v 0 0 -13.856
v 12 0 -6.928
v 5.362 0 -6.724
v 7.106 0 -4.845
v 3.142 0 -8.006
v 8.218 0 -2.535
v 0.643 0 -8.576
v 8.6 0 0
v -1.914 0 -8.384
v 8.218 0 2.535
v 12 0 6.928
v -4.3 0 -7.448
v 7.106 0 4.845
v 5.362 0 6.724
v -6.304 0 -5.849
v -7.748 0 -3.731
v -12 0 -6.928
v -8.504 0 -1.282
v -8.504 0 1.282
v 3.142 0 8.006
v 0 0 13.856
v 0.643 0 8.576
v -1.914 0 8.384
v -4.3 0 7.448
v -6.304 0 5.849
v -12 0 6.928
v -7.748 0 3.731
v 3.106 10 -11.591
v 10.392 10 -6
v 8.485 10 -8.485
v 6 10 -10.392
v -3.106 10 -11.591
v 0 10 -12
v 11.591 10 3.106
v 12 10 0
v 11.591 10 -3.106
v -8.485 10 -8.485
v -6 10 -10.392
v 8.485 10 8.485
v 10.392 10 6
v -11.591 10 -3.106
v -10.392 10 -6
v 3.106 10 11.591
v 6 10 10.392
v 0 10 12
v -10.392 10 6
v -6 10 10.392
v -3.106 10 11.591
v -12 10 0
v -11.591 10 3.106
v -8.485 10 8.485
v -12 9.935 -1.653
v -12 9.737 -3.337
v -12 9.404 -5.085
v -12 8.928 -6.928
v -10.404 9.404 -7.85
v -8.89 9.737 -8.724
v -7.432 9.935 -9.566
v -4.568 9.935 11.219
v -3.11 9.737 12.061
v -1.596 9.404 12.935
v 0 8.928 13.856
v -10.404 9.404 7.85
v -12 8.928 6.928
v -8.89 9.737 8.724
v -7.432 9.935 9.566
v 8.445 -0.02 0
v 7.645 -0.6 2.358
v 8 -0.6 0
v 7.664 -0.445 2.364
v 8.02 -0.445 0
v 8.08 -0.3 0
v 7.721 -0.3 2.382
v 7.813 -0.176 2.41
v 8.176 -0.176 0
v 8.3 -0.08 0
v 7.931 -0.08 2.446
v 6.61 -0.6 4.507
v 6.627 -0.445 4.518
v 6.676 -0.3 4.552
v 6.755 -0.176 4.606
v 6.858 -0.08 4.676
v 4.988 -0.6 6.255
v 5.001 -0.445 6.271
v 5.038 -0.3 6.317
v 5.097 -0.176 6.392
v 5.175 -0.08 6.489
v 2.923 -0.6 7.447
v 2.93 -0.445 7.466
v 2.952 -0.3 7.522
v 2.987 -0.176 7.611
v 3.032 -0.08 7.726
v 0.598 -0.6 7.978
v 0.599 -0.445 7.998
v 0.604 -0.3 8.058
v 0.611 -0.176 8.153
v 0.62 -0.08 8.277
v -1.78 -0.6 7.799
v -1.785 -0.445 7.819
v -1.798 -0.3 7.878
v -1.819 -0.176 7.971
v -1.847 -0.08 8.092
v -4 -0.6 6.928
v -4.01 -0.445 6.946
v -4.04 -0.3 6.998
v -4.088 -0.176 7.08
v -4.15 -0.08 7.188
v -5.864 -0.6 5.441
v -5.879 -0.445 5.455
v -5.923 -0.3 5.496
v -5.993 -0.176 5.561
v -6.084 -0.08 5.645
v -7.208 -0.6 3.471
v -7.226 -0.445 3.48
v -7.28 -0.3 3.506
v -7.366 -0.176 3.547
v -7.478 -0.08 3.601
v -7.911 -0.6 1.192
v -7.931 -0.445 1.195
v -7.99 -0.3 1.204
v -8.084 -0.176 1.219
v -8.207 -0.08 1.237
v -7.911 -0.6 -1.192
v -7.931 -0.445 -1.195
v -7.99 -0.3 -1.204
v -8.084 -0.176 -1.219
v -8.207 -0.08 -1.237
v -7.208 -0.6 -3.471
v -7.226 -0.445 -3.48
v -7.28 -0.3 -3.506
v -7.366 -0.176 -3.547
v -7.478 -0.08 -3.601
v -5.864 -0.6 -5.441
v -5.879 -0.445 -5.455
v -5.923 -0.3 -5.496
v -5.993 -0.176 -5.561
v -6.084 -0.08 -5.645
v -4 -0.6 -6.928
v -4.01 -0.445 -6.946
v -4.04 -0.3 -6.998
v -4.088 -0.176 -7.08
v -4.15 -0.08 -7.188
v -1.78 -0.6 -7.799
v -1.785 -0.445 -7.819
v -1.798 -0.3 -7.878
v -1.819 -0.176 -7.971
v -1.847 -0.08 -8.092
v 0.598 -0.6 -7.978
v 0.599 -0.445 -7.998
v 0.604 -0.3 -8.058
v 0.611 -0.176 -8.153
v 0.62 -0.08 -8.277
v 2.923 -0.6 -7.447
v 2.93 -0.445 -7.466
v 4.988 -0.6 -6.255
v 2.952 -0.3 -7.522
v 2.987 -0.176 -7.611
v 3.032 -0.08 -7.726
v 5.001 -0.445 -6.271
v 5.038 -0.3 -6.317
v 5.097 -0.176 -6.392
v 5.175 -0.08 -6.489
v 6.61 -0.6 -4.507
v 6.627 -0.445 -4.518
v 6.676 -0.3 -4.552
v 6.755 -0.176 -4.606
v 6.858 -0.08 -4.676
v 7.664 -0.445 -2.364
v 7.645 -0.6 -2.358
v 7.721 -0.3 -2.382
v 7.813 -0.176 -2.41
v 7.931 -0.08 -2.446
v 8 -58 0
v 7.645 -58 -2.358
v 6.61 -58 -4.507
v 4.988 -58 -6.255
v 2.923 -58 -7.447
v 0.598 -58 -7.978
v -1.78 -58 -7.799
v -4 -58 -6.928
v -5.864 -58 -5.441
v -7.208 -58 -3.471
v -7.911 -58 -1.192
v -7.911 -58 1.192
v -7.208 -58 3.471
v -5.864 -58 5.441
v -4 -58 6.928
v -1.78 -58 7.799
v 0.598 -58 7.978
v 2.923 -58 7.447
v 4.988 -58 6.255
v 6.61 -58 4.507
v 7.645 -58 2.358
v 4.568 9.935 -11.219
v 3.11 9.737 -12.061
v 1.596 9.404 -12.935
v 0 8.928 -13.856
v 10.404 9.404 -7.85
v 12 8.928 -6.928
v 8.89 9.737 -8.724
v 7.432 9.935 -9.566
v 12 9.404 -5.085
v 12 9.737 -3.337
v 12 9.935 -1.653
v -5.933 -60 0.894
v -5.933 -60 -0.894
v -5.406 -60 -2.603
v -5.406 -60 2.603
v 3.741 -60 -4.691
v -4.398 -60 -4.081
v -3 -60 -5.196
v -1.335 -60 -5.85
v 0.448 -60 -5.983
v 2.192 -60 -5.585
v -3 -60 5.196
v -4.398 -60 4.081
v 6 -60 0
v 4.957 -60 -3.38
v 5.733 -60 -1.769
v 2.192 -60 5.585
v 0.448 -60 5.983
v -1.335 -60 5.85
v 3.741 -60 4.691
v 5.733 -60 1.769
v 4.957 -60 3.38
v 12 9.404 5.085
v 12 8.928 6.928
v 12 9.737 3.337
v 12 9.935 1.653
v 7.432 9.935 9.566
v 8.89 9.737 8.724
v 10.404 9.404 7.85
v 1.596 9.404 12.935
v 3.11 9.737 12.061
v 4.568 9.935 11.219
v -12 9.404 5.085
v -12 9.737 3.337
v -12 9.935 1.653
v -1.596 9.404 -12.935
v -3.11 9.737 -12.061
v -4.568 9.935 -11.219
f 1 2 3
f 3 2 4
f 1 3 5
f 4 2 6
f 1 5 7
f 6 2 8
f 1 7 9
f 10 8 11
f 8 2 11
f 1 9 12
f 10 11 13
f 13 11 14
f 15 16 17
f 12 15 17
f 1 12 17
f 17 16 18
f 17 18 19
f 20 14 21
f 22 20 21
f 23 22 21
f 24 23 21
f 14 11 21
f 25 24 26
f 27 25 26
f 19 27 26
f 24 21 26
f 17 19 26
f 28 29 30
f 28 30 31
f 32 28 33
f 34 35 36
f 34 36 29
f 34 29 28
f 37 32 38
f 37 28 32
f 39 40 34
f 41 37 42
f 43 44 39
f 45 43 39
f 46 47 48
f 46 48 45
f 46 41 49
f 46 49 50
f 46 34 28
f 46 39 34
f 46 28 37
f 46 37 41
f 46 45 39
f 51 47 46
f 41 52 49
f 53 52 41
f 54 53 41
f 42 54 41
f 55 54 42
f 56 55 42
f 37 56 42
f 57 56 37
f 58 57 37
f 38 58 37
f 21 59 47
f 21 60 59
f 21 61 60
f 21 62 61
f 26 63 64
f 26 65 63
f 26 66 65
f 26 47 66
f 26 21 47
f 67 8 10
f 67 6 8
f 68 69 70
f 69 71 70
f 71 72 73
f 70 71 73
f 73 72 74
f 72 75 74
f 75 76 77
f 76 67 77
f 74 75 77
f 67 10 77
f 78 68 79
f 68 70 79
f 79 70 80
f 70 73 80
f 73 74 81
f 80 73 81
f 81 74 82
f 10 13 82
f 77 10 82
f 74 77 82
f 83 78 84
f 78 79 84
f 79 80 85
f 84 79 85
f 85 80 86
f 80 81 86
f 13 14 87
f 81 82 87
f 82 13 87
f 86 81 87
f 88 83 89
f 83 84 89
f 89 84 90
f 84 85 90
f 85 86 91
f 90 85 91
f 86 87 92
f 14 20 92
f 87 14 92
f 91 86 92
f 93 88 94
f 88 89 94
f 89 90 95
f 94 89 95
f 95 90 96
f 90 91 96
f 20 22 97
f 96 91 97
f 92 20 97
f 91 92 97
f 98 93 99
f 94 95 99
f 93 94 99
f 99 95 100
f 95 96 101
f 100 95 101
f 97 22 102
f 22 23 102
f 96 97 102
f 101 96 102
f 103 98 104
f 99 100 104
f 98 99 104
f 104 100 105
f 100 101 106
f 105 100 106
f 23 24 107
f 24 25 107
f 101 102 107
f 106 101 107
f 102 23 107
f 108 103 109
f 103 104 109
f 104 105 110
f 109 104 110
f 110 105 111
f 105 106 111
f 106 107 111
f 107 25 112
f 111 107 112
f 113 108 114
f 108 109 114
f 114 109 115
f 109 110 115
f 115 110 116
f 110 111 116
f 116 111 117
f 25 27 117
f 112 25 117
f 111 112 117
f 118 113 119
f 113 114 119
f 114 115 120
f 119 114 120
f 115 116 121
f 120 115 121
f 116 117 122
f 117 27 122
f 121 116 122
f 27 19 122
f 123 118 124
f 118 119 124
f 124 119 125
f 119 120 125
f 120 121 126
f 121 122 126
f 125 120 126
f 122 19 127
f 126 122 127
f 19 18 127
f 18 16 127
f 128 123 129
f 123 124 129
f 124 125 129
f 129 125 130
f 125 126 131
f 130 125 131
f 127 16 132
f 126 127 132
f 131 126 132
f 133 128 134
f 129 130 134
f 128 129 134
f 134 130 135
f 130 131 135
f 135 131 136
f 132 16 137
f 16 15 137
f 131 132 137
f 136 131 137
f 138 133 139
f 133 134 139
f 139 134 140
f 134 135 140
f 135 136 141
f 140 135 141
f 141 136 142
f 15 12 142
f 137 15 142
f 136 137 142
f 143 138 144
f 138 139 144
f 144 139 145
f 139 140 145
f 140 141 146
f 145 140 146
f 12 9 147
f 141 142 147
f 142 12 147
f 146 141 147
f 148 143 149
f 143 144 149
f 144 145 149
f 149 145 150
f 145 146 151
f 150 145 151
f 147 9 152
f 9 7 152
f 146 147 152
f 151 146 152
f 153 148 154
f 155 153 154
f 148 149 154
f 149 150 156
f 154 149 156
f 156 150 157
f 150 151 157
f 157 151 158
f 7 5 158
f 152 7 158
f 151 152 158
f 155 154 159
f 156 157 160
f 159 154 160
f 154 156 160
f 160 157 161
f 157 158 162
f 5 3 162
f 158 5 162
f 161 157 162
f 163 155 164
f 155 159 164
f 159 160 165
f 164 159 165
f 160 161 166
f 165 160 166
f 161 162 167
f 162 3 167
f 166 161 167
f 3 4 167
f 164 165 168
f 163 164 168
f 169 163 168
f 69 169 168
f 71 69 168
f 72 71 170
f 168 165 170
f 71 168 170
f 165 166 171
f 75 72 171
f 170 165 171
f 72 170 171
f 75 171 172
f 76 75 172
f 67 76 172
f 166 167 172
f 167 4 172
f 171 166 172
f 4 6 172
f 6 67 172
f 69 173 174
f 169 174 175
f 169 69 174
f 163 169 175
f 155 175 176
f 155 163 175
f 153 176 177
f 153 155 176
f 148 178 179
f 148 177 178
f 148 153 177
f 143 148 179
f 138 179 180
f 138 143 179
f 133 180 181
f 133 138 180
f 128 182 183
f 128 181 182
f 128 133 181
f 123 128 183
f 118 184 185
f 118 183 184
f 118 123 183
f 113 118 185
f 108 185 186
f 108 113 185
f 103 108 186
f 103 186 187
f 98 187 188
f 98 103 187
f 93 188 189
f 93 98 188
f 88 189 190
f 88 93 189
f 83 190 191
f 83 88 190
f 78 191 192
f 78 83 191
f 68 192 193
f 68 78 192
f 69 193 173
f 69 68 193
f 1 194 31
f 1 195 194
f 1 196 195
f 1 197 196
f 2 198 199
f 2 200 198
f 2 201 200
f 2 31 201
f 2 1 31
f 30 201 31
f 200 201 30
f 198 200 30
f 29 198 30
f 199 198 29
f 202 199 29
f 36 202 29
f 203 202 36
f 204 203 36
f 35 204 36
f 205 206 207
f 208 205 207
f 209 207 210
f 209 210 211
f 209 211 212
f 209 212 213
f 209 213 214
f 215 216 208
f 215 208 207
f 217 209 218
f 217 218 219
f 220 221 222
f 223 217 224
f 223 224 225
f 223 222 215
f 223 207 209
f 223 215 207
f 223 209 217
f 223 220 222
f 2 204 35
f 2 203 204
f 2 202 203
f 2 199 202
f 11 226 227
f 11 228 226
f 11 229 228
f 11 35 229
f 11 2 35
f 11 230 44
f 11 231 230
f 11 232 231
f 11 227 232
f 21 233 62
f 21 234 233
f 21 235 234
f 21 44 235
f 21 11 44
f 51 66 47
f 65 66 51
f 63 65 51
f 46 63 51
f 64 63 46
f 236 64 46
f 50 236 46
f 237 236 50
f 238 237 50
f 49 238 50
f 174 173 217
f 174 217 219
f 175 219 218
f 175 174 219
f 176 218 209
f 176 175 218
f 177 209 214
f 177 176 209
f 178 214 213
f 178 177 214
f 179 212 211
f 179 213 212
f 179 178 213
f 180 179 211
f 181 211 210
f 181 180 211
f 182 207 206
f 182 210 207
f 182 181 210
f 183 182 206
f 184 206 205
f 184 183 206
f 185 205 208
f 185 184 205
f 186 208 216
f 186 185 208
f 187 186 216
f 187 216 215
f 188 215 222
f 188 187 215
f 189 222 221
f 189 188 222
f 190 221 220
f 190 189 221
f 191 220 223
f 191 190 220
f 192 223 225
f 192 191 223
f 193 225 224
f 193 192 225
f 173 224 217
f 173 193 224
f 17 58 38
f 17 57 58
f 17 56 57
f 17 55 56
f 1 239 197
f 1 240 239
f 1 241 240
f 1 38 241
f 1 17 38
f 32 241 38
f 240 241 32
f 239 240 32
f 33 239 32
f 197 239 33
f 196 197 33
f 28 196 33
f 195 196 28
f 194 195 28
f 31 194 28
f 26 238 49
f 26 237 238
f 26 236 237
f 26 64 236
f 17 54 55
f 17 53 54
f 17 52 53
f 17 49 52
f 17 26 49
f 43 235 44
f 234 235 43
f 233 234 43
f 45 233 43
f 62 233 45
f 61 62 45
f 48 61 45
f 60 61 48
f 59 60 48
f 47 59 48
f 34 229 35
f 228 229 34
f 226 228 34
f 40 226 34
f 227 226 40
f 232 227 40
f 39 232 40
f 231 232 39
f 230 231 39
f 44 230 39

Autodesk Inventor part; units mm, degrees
ref_plane "YZ Plane" through (0, 0, 0) normal (1, 0, 0) x (0, 1, 0)
ref_plane "XZ Plane" through (0, 0, 0) normal (0, 1, 0) x (-1, 0, 0)
ref_plane "XY Plane" through (0, 0, 0) normal (0, 0, 1) x (1, 0, 0)
sketch "Sketch1" plane through (0, 0, 0) normal (0, 1, 0) x (-1, 0, 0)
  line L0 (12, -6.9282) -> (0, -13.8564)
  line L1 (0, -13.8564) -> (-12, -6.9282)
  line L2 (-12, -6.9282) -> (-12, 6.9282)
  line L3 (-12, 6.9282) -> (0, 13.8564)
  line L4 (0, 13.8564) -> (12, 6.9282)
  line L5 (12, 6.9282) -> (12, -6.9282)
  point P0 (0, 0)
  point P1 (0, 0)
  point P2 (-12, 0)
  point P3 (12, 0)
  dimension "d0" = 24
extrude "Extrusion1" add sketch "Sketch1" along normal blind 10
sketch "Sketch2" plane through (0, 10, 0) normal (0, 1, 0) x (1, 0, 0)
  circle A0 centre (0, 0) radius 12
extrude "Extrusion2" cut sketch "Sketch2" against normal blind 10 draft 60 keep common part
sketch "Sketch3" plane through (0, 0, 0) normal (0, -1, 0) x (1, 0, 0)
  circle A0 centre (0, 0) radius 8
  dimension "d5" = 16
extrude "Extrusion3" add sketch "Sketch3" along normal blind 60
thread "Thread1" size "M16x2" class "6g" standard "ANSI Metric M Profile" length 38
chamfer "Chamfer1" distance 2 angle 45 1 edges at (-8, -60, 0)
fillet "Fillet1" radius 0.6 1 edges at (-8, 0, 0)
properties part number "csavark" material "Steel, Alloy"
